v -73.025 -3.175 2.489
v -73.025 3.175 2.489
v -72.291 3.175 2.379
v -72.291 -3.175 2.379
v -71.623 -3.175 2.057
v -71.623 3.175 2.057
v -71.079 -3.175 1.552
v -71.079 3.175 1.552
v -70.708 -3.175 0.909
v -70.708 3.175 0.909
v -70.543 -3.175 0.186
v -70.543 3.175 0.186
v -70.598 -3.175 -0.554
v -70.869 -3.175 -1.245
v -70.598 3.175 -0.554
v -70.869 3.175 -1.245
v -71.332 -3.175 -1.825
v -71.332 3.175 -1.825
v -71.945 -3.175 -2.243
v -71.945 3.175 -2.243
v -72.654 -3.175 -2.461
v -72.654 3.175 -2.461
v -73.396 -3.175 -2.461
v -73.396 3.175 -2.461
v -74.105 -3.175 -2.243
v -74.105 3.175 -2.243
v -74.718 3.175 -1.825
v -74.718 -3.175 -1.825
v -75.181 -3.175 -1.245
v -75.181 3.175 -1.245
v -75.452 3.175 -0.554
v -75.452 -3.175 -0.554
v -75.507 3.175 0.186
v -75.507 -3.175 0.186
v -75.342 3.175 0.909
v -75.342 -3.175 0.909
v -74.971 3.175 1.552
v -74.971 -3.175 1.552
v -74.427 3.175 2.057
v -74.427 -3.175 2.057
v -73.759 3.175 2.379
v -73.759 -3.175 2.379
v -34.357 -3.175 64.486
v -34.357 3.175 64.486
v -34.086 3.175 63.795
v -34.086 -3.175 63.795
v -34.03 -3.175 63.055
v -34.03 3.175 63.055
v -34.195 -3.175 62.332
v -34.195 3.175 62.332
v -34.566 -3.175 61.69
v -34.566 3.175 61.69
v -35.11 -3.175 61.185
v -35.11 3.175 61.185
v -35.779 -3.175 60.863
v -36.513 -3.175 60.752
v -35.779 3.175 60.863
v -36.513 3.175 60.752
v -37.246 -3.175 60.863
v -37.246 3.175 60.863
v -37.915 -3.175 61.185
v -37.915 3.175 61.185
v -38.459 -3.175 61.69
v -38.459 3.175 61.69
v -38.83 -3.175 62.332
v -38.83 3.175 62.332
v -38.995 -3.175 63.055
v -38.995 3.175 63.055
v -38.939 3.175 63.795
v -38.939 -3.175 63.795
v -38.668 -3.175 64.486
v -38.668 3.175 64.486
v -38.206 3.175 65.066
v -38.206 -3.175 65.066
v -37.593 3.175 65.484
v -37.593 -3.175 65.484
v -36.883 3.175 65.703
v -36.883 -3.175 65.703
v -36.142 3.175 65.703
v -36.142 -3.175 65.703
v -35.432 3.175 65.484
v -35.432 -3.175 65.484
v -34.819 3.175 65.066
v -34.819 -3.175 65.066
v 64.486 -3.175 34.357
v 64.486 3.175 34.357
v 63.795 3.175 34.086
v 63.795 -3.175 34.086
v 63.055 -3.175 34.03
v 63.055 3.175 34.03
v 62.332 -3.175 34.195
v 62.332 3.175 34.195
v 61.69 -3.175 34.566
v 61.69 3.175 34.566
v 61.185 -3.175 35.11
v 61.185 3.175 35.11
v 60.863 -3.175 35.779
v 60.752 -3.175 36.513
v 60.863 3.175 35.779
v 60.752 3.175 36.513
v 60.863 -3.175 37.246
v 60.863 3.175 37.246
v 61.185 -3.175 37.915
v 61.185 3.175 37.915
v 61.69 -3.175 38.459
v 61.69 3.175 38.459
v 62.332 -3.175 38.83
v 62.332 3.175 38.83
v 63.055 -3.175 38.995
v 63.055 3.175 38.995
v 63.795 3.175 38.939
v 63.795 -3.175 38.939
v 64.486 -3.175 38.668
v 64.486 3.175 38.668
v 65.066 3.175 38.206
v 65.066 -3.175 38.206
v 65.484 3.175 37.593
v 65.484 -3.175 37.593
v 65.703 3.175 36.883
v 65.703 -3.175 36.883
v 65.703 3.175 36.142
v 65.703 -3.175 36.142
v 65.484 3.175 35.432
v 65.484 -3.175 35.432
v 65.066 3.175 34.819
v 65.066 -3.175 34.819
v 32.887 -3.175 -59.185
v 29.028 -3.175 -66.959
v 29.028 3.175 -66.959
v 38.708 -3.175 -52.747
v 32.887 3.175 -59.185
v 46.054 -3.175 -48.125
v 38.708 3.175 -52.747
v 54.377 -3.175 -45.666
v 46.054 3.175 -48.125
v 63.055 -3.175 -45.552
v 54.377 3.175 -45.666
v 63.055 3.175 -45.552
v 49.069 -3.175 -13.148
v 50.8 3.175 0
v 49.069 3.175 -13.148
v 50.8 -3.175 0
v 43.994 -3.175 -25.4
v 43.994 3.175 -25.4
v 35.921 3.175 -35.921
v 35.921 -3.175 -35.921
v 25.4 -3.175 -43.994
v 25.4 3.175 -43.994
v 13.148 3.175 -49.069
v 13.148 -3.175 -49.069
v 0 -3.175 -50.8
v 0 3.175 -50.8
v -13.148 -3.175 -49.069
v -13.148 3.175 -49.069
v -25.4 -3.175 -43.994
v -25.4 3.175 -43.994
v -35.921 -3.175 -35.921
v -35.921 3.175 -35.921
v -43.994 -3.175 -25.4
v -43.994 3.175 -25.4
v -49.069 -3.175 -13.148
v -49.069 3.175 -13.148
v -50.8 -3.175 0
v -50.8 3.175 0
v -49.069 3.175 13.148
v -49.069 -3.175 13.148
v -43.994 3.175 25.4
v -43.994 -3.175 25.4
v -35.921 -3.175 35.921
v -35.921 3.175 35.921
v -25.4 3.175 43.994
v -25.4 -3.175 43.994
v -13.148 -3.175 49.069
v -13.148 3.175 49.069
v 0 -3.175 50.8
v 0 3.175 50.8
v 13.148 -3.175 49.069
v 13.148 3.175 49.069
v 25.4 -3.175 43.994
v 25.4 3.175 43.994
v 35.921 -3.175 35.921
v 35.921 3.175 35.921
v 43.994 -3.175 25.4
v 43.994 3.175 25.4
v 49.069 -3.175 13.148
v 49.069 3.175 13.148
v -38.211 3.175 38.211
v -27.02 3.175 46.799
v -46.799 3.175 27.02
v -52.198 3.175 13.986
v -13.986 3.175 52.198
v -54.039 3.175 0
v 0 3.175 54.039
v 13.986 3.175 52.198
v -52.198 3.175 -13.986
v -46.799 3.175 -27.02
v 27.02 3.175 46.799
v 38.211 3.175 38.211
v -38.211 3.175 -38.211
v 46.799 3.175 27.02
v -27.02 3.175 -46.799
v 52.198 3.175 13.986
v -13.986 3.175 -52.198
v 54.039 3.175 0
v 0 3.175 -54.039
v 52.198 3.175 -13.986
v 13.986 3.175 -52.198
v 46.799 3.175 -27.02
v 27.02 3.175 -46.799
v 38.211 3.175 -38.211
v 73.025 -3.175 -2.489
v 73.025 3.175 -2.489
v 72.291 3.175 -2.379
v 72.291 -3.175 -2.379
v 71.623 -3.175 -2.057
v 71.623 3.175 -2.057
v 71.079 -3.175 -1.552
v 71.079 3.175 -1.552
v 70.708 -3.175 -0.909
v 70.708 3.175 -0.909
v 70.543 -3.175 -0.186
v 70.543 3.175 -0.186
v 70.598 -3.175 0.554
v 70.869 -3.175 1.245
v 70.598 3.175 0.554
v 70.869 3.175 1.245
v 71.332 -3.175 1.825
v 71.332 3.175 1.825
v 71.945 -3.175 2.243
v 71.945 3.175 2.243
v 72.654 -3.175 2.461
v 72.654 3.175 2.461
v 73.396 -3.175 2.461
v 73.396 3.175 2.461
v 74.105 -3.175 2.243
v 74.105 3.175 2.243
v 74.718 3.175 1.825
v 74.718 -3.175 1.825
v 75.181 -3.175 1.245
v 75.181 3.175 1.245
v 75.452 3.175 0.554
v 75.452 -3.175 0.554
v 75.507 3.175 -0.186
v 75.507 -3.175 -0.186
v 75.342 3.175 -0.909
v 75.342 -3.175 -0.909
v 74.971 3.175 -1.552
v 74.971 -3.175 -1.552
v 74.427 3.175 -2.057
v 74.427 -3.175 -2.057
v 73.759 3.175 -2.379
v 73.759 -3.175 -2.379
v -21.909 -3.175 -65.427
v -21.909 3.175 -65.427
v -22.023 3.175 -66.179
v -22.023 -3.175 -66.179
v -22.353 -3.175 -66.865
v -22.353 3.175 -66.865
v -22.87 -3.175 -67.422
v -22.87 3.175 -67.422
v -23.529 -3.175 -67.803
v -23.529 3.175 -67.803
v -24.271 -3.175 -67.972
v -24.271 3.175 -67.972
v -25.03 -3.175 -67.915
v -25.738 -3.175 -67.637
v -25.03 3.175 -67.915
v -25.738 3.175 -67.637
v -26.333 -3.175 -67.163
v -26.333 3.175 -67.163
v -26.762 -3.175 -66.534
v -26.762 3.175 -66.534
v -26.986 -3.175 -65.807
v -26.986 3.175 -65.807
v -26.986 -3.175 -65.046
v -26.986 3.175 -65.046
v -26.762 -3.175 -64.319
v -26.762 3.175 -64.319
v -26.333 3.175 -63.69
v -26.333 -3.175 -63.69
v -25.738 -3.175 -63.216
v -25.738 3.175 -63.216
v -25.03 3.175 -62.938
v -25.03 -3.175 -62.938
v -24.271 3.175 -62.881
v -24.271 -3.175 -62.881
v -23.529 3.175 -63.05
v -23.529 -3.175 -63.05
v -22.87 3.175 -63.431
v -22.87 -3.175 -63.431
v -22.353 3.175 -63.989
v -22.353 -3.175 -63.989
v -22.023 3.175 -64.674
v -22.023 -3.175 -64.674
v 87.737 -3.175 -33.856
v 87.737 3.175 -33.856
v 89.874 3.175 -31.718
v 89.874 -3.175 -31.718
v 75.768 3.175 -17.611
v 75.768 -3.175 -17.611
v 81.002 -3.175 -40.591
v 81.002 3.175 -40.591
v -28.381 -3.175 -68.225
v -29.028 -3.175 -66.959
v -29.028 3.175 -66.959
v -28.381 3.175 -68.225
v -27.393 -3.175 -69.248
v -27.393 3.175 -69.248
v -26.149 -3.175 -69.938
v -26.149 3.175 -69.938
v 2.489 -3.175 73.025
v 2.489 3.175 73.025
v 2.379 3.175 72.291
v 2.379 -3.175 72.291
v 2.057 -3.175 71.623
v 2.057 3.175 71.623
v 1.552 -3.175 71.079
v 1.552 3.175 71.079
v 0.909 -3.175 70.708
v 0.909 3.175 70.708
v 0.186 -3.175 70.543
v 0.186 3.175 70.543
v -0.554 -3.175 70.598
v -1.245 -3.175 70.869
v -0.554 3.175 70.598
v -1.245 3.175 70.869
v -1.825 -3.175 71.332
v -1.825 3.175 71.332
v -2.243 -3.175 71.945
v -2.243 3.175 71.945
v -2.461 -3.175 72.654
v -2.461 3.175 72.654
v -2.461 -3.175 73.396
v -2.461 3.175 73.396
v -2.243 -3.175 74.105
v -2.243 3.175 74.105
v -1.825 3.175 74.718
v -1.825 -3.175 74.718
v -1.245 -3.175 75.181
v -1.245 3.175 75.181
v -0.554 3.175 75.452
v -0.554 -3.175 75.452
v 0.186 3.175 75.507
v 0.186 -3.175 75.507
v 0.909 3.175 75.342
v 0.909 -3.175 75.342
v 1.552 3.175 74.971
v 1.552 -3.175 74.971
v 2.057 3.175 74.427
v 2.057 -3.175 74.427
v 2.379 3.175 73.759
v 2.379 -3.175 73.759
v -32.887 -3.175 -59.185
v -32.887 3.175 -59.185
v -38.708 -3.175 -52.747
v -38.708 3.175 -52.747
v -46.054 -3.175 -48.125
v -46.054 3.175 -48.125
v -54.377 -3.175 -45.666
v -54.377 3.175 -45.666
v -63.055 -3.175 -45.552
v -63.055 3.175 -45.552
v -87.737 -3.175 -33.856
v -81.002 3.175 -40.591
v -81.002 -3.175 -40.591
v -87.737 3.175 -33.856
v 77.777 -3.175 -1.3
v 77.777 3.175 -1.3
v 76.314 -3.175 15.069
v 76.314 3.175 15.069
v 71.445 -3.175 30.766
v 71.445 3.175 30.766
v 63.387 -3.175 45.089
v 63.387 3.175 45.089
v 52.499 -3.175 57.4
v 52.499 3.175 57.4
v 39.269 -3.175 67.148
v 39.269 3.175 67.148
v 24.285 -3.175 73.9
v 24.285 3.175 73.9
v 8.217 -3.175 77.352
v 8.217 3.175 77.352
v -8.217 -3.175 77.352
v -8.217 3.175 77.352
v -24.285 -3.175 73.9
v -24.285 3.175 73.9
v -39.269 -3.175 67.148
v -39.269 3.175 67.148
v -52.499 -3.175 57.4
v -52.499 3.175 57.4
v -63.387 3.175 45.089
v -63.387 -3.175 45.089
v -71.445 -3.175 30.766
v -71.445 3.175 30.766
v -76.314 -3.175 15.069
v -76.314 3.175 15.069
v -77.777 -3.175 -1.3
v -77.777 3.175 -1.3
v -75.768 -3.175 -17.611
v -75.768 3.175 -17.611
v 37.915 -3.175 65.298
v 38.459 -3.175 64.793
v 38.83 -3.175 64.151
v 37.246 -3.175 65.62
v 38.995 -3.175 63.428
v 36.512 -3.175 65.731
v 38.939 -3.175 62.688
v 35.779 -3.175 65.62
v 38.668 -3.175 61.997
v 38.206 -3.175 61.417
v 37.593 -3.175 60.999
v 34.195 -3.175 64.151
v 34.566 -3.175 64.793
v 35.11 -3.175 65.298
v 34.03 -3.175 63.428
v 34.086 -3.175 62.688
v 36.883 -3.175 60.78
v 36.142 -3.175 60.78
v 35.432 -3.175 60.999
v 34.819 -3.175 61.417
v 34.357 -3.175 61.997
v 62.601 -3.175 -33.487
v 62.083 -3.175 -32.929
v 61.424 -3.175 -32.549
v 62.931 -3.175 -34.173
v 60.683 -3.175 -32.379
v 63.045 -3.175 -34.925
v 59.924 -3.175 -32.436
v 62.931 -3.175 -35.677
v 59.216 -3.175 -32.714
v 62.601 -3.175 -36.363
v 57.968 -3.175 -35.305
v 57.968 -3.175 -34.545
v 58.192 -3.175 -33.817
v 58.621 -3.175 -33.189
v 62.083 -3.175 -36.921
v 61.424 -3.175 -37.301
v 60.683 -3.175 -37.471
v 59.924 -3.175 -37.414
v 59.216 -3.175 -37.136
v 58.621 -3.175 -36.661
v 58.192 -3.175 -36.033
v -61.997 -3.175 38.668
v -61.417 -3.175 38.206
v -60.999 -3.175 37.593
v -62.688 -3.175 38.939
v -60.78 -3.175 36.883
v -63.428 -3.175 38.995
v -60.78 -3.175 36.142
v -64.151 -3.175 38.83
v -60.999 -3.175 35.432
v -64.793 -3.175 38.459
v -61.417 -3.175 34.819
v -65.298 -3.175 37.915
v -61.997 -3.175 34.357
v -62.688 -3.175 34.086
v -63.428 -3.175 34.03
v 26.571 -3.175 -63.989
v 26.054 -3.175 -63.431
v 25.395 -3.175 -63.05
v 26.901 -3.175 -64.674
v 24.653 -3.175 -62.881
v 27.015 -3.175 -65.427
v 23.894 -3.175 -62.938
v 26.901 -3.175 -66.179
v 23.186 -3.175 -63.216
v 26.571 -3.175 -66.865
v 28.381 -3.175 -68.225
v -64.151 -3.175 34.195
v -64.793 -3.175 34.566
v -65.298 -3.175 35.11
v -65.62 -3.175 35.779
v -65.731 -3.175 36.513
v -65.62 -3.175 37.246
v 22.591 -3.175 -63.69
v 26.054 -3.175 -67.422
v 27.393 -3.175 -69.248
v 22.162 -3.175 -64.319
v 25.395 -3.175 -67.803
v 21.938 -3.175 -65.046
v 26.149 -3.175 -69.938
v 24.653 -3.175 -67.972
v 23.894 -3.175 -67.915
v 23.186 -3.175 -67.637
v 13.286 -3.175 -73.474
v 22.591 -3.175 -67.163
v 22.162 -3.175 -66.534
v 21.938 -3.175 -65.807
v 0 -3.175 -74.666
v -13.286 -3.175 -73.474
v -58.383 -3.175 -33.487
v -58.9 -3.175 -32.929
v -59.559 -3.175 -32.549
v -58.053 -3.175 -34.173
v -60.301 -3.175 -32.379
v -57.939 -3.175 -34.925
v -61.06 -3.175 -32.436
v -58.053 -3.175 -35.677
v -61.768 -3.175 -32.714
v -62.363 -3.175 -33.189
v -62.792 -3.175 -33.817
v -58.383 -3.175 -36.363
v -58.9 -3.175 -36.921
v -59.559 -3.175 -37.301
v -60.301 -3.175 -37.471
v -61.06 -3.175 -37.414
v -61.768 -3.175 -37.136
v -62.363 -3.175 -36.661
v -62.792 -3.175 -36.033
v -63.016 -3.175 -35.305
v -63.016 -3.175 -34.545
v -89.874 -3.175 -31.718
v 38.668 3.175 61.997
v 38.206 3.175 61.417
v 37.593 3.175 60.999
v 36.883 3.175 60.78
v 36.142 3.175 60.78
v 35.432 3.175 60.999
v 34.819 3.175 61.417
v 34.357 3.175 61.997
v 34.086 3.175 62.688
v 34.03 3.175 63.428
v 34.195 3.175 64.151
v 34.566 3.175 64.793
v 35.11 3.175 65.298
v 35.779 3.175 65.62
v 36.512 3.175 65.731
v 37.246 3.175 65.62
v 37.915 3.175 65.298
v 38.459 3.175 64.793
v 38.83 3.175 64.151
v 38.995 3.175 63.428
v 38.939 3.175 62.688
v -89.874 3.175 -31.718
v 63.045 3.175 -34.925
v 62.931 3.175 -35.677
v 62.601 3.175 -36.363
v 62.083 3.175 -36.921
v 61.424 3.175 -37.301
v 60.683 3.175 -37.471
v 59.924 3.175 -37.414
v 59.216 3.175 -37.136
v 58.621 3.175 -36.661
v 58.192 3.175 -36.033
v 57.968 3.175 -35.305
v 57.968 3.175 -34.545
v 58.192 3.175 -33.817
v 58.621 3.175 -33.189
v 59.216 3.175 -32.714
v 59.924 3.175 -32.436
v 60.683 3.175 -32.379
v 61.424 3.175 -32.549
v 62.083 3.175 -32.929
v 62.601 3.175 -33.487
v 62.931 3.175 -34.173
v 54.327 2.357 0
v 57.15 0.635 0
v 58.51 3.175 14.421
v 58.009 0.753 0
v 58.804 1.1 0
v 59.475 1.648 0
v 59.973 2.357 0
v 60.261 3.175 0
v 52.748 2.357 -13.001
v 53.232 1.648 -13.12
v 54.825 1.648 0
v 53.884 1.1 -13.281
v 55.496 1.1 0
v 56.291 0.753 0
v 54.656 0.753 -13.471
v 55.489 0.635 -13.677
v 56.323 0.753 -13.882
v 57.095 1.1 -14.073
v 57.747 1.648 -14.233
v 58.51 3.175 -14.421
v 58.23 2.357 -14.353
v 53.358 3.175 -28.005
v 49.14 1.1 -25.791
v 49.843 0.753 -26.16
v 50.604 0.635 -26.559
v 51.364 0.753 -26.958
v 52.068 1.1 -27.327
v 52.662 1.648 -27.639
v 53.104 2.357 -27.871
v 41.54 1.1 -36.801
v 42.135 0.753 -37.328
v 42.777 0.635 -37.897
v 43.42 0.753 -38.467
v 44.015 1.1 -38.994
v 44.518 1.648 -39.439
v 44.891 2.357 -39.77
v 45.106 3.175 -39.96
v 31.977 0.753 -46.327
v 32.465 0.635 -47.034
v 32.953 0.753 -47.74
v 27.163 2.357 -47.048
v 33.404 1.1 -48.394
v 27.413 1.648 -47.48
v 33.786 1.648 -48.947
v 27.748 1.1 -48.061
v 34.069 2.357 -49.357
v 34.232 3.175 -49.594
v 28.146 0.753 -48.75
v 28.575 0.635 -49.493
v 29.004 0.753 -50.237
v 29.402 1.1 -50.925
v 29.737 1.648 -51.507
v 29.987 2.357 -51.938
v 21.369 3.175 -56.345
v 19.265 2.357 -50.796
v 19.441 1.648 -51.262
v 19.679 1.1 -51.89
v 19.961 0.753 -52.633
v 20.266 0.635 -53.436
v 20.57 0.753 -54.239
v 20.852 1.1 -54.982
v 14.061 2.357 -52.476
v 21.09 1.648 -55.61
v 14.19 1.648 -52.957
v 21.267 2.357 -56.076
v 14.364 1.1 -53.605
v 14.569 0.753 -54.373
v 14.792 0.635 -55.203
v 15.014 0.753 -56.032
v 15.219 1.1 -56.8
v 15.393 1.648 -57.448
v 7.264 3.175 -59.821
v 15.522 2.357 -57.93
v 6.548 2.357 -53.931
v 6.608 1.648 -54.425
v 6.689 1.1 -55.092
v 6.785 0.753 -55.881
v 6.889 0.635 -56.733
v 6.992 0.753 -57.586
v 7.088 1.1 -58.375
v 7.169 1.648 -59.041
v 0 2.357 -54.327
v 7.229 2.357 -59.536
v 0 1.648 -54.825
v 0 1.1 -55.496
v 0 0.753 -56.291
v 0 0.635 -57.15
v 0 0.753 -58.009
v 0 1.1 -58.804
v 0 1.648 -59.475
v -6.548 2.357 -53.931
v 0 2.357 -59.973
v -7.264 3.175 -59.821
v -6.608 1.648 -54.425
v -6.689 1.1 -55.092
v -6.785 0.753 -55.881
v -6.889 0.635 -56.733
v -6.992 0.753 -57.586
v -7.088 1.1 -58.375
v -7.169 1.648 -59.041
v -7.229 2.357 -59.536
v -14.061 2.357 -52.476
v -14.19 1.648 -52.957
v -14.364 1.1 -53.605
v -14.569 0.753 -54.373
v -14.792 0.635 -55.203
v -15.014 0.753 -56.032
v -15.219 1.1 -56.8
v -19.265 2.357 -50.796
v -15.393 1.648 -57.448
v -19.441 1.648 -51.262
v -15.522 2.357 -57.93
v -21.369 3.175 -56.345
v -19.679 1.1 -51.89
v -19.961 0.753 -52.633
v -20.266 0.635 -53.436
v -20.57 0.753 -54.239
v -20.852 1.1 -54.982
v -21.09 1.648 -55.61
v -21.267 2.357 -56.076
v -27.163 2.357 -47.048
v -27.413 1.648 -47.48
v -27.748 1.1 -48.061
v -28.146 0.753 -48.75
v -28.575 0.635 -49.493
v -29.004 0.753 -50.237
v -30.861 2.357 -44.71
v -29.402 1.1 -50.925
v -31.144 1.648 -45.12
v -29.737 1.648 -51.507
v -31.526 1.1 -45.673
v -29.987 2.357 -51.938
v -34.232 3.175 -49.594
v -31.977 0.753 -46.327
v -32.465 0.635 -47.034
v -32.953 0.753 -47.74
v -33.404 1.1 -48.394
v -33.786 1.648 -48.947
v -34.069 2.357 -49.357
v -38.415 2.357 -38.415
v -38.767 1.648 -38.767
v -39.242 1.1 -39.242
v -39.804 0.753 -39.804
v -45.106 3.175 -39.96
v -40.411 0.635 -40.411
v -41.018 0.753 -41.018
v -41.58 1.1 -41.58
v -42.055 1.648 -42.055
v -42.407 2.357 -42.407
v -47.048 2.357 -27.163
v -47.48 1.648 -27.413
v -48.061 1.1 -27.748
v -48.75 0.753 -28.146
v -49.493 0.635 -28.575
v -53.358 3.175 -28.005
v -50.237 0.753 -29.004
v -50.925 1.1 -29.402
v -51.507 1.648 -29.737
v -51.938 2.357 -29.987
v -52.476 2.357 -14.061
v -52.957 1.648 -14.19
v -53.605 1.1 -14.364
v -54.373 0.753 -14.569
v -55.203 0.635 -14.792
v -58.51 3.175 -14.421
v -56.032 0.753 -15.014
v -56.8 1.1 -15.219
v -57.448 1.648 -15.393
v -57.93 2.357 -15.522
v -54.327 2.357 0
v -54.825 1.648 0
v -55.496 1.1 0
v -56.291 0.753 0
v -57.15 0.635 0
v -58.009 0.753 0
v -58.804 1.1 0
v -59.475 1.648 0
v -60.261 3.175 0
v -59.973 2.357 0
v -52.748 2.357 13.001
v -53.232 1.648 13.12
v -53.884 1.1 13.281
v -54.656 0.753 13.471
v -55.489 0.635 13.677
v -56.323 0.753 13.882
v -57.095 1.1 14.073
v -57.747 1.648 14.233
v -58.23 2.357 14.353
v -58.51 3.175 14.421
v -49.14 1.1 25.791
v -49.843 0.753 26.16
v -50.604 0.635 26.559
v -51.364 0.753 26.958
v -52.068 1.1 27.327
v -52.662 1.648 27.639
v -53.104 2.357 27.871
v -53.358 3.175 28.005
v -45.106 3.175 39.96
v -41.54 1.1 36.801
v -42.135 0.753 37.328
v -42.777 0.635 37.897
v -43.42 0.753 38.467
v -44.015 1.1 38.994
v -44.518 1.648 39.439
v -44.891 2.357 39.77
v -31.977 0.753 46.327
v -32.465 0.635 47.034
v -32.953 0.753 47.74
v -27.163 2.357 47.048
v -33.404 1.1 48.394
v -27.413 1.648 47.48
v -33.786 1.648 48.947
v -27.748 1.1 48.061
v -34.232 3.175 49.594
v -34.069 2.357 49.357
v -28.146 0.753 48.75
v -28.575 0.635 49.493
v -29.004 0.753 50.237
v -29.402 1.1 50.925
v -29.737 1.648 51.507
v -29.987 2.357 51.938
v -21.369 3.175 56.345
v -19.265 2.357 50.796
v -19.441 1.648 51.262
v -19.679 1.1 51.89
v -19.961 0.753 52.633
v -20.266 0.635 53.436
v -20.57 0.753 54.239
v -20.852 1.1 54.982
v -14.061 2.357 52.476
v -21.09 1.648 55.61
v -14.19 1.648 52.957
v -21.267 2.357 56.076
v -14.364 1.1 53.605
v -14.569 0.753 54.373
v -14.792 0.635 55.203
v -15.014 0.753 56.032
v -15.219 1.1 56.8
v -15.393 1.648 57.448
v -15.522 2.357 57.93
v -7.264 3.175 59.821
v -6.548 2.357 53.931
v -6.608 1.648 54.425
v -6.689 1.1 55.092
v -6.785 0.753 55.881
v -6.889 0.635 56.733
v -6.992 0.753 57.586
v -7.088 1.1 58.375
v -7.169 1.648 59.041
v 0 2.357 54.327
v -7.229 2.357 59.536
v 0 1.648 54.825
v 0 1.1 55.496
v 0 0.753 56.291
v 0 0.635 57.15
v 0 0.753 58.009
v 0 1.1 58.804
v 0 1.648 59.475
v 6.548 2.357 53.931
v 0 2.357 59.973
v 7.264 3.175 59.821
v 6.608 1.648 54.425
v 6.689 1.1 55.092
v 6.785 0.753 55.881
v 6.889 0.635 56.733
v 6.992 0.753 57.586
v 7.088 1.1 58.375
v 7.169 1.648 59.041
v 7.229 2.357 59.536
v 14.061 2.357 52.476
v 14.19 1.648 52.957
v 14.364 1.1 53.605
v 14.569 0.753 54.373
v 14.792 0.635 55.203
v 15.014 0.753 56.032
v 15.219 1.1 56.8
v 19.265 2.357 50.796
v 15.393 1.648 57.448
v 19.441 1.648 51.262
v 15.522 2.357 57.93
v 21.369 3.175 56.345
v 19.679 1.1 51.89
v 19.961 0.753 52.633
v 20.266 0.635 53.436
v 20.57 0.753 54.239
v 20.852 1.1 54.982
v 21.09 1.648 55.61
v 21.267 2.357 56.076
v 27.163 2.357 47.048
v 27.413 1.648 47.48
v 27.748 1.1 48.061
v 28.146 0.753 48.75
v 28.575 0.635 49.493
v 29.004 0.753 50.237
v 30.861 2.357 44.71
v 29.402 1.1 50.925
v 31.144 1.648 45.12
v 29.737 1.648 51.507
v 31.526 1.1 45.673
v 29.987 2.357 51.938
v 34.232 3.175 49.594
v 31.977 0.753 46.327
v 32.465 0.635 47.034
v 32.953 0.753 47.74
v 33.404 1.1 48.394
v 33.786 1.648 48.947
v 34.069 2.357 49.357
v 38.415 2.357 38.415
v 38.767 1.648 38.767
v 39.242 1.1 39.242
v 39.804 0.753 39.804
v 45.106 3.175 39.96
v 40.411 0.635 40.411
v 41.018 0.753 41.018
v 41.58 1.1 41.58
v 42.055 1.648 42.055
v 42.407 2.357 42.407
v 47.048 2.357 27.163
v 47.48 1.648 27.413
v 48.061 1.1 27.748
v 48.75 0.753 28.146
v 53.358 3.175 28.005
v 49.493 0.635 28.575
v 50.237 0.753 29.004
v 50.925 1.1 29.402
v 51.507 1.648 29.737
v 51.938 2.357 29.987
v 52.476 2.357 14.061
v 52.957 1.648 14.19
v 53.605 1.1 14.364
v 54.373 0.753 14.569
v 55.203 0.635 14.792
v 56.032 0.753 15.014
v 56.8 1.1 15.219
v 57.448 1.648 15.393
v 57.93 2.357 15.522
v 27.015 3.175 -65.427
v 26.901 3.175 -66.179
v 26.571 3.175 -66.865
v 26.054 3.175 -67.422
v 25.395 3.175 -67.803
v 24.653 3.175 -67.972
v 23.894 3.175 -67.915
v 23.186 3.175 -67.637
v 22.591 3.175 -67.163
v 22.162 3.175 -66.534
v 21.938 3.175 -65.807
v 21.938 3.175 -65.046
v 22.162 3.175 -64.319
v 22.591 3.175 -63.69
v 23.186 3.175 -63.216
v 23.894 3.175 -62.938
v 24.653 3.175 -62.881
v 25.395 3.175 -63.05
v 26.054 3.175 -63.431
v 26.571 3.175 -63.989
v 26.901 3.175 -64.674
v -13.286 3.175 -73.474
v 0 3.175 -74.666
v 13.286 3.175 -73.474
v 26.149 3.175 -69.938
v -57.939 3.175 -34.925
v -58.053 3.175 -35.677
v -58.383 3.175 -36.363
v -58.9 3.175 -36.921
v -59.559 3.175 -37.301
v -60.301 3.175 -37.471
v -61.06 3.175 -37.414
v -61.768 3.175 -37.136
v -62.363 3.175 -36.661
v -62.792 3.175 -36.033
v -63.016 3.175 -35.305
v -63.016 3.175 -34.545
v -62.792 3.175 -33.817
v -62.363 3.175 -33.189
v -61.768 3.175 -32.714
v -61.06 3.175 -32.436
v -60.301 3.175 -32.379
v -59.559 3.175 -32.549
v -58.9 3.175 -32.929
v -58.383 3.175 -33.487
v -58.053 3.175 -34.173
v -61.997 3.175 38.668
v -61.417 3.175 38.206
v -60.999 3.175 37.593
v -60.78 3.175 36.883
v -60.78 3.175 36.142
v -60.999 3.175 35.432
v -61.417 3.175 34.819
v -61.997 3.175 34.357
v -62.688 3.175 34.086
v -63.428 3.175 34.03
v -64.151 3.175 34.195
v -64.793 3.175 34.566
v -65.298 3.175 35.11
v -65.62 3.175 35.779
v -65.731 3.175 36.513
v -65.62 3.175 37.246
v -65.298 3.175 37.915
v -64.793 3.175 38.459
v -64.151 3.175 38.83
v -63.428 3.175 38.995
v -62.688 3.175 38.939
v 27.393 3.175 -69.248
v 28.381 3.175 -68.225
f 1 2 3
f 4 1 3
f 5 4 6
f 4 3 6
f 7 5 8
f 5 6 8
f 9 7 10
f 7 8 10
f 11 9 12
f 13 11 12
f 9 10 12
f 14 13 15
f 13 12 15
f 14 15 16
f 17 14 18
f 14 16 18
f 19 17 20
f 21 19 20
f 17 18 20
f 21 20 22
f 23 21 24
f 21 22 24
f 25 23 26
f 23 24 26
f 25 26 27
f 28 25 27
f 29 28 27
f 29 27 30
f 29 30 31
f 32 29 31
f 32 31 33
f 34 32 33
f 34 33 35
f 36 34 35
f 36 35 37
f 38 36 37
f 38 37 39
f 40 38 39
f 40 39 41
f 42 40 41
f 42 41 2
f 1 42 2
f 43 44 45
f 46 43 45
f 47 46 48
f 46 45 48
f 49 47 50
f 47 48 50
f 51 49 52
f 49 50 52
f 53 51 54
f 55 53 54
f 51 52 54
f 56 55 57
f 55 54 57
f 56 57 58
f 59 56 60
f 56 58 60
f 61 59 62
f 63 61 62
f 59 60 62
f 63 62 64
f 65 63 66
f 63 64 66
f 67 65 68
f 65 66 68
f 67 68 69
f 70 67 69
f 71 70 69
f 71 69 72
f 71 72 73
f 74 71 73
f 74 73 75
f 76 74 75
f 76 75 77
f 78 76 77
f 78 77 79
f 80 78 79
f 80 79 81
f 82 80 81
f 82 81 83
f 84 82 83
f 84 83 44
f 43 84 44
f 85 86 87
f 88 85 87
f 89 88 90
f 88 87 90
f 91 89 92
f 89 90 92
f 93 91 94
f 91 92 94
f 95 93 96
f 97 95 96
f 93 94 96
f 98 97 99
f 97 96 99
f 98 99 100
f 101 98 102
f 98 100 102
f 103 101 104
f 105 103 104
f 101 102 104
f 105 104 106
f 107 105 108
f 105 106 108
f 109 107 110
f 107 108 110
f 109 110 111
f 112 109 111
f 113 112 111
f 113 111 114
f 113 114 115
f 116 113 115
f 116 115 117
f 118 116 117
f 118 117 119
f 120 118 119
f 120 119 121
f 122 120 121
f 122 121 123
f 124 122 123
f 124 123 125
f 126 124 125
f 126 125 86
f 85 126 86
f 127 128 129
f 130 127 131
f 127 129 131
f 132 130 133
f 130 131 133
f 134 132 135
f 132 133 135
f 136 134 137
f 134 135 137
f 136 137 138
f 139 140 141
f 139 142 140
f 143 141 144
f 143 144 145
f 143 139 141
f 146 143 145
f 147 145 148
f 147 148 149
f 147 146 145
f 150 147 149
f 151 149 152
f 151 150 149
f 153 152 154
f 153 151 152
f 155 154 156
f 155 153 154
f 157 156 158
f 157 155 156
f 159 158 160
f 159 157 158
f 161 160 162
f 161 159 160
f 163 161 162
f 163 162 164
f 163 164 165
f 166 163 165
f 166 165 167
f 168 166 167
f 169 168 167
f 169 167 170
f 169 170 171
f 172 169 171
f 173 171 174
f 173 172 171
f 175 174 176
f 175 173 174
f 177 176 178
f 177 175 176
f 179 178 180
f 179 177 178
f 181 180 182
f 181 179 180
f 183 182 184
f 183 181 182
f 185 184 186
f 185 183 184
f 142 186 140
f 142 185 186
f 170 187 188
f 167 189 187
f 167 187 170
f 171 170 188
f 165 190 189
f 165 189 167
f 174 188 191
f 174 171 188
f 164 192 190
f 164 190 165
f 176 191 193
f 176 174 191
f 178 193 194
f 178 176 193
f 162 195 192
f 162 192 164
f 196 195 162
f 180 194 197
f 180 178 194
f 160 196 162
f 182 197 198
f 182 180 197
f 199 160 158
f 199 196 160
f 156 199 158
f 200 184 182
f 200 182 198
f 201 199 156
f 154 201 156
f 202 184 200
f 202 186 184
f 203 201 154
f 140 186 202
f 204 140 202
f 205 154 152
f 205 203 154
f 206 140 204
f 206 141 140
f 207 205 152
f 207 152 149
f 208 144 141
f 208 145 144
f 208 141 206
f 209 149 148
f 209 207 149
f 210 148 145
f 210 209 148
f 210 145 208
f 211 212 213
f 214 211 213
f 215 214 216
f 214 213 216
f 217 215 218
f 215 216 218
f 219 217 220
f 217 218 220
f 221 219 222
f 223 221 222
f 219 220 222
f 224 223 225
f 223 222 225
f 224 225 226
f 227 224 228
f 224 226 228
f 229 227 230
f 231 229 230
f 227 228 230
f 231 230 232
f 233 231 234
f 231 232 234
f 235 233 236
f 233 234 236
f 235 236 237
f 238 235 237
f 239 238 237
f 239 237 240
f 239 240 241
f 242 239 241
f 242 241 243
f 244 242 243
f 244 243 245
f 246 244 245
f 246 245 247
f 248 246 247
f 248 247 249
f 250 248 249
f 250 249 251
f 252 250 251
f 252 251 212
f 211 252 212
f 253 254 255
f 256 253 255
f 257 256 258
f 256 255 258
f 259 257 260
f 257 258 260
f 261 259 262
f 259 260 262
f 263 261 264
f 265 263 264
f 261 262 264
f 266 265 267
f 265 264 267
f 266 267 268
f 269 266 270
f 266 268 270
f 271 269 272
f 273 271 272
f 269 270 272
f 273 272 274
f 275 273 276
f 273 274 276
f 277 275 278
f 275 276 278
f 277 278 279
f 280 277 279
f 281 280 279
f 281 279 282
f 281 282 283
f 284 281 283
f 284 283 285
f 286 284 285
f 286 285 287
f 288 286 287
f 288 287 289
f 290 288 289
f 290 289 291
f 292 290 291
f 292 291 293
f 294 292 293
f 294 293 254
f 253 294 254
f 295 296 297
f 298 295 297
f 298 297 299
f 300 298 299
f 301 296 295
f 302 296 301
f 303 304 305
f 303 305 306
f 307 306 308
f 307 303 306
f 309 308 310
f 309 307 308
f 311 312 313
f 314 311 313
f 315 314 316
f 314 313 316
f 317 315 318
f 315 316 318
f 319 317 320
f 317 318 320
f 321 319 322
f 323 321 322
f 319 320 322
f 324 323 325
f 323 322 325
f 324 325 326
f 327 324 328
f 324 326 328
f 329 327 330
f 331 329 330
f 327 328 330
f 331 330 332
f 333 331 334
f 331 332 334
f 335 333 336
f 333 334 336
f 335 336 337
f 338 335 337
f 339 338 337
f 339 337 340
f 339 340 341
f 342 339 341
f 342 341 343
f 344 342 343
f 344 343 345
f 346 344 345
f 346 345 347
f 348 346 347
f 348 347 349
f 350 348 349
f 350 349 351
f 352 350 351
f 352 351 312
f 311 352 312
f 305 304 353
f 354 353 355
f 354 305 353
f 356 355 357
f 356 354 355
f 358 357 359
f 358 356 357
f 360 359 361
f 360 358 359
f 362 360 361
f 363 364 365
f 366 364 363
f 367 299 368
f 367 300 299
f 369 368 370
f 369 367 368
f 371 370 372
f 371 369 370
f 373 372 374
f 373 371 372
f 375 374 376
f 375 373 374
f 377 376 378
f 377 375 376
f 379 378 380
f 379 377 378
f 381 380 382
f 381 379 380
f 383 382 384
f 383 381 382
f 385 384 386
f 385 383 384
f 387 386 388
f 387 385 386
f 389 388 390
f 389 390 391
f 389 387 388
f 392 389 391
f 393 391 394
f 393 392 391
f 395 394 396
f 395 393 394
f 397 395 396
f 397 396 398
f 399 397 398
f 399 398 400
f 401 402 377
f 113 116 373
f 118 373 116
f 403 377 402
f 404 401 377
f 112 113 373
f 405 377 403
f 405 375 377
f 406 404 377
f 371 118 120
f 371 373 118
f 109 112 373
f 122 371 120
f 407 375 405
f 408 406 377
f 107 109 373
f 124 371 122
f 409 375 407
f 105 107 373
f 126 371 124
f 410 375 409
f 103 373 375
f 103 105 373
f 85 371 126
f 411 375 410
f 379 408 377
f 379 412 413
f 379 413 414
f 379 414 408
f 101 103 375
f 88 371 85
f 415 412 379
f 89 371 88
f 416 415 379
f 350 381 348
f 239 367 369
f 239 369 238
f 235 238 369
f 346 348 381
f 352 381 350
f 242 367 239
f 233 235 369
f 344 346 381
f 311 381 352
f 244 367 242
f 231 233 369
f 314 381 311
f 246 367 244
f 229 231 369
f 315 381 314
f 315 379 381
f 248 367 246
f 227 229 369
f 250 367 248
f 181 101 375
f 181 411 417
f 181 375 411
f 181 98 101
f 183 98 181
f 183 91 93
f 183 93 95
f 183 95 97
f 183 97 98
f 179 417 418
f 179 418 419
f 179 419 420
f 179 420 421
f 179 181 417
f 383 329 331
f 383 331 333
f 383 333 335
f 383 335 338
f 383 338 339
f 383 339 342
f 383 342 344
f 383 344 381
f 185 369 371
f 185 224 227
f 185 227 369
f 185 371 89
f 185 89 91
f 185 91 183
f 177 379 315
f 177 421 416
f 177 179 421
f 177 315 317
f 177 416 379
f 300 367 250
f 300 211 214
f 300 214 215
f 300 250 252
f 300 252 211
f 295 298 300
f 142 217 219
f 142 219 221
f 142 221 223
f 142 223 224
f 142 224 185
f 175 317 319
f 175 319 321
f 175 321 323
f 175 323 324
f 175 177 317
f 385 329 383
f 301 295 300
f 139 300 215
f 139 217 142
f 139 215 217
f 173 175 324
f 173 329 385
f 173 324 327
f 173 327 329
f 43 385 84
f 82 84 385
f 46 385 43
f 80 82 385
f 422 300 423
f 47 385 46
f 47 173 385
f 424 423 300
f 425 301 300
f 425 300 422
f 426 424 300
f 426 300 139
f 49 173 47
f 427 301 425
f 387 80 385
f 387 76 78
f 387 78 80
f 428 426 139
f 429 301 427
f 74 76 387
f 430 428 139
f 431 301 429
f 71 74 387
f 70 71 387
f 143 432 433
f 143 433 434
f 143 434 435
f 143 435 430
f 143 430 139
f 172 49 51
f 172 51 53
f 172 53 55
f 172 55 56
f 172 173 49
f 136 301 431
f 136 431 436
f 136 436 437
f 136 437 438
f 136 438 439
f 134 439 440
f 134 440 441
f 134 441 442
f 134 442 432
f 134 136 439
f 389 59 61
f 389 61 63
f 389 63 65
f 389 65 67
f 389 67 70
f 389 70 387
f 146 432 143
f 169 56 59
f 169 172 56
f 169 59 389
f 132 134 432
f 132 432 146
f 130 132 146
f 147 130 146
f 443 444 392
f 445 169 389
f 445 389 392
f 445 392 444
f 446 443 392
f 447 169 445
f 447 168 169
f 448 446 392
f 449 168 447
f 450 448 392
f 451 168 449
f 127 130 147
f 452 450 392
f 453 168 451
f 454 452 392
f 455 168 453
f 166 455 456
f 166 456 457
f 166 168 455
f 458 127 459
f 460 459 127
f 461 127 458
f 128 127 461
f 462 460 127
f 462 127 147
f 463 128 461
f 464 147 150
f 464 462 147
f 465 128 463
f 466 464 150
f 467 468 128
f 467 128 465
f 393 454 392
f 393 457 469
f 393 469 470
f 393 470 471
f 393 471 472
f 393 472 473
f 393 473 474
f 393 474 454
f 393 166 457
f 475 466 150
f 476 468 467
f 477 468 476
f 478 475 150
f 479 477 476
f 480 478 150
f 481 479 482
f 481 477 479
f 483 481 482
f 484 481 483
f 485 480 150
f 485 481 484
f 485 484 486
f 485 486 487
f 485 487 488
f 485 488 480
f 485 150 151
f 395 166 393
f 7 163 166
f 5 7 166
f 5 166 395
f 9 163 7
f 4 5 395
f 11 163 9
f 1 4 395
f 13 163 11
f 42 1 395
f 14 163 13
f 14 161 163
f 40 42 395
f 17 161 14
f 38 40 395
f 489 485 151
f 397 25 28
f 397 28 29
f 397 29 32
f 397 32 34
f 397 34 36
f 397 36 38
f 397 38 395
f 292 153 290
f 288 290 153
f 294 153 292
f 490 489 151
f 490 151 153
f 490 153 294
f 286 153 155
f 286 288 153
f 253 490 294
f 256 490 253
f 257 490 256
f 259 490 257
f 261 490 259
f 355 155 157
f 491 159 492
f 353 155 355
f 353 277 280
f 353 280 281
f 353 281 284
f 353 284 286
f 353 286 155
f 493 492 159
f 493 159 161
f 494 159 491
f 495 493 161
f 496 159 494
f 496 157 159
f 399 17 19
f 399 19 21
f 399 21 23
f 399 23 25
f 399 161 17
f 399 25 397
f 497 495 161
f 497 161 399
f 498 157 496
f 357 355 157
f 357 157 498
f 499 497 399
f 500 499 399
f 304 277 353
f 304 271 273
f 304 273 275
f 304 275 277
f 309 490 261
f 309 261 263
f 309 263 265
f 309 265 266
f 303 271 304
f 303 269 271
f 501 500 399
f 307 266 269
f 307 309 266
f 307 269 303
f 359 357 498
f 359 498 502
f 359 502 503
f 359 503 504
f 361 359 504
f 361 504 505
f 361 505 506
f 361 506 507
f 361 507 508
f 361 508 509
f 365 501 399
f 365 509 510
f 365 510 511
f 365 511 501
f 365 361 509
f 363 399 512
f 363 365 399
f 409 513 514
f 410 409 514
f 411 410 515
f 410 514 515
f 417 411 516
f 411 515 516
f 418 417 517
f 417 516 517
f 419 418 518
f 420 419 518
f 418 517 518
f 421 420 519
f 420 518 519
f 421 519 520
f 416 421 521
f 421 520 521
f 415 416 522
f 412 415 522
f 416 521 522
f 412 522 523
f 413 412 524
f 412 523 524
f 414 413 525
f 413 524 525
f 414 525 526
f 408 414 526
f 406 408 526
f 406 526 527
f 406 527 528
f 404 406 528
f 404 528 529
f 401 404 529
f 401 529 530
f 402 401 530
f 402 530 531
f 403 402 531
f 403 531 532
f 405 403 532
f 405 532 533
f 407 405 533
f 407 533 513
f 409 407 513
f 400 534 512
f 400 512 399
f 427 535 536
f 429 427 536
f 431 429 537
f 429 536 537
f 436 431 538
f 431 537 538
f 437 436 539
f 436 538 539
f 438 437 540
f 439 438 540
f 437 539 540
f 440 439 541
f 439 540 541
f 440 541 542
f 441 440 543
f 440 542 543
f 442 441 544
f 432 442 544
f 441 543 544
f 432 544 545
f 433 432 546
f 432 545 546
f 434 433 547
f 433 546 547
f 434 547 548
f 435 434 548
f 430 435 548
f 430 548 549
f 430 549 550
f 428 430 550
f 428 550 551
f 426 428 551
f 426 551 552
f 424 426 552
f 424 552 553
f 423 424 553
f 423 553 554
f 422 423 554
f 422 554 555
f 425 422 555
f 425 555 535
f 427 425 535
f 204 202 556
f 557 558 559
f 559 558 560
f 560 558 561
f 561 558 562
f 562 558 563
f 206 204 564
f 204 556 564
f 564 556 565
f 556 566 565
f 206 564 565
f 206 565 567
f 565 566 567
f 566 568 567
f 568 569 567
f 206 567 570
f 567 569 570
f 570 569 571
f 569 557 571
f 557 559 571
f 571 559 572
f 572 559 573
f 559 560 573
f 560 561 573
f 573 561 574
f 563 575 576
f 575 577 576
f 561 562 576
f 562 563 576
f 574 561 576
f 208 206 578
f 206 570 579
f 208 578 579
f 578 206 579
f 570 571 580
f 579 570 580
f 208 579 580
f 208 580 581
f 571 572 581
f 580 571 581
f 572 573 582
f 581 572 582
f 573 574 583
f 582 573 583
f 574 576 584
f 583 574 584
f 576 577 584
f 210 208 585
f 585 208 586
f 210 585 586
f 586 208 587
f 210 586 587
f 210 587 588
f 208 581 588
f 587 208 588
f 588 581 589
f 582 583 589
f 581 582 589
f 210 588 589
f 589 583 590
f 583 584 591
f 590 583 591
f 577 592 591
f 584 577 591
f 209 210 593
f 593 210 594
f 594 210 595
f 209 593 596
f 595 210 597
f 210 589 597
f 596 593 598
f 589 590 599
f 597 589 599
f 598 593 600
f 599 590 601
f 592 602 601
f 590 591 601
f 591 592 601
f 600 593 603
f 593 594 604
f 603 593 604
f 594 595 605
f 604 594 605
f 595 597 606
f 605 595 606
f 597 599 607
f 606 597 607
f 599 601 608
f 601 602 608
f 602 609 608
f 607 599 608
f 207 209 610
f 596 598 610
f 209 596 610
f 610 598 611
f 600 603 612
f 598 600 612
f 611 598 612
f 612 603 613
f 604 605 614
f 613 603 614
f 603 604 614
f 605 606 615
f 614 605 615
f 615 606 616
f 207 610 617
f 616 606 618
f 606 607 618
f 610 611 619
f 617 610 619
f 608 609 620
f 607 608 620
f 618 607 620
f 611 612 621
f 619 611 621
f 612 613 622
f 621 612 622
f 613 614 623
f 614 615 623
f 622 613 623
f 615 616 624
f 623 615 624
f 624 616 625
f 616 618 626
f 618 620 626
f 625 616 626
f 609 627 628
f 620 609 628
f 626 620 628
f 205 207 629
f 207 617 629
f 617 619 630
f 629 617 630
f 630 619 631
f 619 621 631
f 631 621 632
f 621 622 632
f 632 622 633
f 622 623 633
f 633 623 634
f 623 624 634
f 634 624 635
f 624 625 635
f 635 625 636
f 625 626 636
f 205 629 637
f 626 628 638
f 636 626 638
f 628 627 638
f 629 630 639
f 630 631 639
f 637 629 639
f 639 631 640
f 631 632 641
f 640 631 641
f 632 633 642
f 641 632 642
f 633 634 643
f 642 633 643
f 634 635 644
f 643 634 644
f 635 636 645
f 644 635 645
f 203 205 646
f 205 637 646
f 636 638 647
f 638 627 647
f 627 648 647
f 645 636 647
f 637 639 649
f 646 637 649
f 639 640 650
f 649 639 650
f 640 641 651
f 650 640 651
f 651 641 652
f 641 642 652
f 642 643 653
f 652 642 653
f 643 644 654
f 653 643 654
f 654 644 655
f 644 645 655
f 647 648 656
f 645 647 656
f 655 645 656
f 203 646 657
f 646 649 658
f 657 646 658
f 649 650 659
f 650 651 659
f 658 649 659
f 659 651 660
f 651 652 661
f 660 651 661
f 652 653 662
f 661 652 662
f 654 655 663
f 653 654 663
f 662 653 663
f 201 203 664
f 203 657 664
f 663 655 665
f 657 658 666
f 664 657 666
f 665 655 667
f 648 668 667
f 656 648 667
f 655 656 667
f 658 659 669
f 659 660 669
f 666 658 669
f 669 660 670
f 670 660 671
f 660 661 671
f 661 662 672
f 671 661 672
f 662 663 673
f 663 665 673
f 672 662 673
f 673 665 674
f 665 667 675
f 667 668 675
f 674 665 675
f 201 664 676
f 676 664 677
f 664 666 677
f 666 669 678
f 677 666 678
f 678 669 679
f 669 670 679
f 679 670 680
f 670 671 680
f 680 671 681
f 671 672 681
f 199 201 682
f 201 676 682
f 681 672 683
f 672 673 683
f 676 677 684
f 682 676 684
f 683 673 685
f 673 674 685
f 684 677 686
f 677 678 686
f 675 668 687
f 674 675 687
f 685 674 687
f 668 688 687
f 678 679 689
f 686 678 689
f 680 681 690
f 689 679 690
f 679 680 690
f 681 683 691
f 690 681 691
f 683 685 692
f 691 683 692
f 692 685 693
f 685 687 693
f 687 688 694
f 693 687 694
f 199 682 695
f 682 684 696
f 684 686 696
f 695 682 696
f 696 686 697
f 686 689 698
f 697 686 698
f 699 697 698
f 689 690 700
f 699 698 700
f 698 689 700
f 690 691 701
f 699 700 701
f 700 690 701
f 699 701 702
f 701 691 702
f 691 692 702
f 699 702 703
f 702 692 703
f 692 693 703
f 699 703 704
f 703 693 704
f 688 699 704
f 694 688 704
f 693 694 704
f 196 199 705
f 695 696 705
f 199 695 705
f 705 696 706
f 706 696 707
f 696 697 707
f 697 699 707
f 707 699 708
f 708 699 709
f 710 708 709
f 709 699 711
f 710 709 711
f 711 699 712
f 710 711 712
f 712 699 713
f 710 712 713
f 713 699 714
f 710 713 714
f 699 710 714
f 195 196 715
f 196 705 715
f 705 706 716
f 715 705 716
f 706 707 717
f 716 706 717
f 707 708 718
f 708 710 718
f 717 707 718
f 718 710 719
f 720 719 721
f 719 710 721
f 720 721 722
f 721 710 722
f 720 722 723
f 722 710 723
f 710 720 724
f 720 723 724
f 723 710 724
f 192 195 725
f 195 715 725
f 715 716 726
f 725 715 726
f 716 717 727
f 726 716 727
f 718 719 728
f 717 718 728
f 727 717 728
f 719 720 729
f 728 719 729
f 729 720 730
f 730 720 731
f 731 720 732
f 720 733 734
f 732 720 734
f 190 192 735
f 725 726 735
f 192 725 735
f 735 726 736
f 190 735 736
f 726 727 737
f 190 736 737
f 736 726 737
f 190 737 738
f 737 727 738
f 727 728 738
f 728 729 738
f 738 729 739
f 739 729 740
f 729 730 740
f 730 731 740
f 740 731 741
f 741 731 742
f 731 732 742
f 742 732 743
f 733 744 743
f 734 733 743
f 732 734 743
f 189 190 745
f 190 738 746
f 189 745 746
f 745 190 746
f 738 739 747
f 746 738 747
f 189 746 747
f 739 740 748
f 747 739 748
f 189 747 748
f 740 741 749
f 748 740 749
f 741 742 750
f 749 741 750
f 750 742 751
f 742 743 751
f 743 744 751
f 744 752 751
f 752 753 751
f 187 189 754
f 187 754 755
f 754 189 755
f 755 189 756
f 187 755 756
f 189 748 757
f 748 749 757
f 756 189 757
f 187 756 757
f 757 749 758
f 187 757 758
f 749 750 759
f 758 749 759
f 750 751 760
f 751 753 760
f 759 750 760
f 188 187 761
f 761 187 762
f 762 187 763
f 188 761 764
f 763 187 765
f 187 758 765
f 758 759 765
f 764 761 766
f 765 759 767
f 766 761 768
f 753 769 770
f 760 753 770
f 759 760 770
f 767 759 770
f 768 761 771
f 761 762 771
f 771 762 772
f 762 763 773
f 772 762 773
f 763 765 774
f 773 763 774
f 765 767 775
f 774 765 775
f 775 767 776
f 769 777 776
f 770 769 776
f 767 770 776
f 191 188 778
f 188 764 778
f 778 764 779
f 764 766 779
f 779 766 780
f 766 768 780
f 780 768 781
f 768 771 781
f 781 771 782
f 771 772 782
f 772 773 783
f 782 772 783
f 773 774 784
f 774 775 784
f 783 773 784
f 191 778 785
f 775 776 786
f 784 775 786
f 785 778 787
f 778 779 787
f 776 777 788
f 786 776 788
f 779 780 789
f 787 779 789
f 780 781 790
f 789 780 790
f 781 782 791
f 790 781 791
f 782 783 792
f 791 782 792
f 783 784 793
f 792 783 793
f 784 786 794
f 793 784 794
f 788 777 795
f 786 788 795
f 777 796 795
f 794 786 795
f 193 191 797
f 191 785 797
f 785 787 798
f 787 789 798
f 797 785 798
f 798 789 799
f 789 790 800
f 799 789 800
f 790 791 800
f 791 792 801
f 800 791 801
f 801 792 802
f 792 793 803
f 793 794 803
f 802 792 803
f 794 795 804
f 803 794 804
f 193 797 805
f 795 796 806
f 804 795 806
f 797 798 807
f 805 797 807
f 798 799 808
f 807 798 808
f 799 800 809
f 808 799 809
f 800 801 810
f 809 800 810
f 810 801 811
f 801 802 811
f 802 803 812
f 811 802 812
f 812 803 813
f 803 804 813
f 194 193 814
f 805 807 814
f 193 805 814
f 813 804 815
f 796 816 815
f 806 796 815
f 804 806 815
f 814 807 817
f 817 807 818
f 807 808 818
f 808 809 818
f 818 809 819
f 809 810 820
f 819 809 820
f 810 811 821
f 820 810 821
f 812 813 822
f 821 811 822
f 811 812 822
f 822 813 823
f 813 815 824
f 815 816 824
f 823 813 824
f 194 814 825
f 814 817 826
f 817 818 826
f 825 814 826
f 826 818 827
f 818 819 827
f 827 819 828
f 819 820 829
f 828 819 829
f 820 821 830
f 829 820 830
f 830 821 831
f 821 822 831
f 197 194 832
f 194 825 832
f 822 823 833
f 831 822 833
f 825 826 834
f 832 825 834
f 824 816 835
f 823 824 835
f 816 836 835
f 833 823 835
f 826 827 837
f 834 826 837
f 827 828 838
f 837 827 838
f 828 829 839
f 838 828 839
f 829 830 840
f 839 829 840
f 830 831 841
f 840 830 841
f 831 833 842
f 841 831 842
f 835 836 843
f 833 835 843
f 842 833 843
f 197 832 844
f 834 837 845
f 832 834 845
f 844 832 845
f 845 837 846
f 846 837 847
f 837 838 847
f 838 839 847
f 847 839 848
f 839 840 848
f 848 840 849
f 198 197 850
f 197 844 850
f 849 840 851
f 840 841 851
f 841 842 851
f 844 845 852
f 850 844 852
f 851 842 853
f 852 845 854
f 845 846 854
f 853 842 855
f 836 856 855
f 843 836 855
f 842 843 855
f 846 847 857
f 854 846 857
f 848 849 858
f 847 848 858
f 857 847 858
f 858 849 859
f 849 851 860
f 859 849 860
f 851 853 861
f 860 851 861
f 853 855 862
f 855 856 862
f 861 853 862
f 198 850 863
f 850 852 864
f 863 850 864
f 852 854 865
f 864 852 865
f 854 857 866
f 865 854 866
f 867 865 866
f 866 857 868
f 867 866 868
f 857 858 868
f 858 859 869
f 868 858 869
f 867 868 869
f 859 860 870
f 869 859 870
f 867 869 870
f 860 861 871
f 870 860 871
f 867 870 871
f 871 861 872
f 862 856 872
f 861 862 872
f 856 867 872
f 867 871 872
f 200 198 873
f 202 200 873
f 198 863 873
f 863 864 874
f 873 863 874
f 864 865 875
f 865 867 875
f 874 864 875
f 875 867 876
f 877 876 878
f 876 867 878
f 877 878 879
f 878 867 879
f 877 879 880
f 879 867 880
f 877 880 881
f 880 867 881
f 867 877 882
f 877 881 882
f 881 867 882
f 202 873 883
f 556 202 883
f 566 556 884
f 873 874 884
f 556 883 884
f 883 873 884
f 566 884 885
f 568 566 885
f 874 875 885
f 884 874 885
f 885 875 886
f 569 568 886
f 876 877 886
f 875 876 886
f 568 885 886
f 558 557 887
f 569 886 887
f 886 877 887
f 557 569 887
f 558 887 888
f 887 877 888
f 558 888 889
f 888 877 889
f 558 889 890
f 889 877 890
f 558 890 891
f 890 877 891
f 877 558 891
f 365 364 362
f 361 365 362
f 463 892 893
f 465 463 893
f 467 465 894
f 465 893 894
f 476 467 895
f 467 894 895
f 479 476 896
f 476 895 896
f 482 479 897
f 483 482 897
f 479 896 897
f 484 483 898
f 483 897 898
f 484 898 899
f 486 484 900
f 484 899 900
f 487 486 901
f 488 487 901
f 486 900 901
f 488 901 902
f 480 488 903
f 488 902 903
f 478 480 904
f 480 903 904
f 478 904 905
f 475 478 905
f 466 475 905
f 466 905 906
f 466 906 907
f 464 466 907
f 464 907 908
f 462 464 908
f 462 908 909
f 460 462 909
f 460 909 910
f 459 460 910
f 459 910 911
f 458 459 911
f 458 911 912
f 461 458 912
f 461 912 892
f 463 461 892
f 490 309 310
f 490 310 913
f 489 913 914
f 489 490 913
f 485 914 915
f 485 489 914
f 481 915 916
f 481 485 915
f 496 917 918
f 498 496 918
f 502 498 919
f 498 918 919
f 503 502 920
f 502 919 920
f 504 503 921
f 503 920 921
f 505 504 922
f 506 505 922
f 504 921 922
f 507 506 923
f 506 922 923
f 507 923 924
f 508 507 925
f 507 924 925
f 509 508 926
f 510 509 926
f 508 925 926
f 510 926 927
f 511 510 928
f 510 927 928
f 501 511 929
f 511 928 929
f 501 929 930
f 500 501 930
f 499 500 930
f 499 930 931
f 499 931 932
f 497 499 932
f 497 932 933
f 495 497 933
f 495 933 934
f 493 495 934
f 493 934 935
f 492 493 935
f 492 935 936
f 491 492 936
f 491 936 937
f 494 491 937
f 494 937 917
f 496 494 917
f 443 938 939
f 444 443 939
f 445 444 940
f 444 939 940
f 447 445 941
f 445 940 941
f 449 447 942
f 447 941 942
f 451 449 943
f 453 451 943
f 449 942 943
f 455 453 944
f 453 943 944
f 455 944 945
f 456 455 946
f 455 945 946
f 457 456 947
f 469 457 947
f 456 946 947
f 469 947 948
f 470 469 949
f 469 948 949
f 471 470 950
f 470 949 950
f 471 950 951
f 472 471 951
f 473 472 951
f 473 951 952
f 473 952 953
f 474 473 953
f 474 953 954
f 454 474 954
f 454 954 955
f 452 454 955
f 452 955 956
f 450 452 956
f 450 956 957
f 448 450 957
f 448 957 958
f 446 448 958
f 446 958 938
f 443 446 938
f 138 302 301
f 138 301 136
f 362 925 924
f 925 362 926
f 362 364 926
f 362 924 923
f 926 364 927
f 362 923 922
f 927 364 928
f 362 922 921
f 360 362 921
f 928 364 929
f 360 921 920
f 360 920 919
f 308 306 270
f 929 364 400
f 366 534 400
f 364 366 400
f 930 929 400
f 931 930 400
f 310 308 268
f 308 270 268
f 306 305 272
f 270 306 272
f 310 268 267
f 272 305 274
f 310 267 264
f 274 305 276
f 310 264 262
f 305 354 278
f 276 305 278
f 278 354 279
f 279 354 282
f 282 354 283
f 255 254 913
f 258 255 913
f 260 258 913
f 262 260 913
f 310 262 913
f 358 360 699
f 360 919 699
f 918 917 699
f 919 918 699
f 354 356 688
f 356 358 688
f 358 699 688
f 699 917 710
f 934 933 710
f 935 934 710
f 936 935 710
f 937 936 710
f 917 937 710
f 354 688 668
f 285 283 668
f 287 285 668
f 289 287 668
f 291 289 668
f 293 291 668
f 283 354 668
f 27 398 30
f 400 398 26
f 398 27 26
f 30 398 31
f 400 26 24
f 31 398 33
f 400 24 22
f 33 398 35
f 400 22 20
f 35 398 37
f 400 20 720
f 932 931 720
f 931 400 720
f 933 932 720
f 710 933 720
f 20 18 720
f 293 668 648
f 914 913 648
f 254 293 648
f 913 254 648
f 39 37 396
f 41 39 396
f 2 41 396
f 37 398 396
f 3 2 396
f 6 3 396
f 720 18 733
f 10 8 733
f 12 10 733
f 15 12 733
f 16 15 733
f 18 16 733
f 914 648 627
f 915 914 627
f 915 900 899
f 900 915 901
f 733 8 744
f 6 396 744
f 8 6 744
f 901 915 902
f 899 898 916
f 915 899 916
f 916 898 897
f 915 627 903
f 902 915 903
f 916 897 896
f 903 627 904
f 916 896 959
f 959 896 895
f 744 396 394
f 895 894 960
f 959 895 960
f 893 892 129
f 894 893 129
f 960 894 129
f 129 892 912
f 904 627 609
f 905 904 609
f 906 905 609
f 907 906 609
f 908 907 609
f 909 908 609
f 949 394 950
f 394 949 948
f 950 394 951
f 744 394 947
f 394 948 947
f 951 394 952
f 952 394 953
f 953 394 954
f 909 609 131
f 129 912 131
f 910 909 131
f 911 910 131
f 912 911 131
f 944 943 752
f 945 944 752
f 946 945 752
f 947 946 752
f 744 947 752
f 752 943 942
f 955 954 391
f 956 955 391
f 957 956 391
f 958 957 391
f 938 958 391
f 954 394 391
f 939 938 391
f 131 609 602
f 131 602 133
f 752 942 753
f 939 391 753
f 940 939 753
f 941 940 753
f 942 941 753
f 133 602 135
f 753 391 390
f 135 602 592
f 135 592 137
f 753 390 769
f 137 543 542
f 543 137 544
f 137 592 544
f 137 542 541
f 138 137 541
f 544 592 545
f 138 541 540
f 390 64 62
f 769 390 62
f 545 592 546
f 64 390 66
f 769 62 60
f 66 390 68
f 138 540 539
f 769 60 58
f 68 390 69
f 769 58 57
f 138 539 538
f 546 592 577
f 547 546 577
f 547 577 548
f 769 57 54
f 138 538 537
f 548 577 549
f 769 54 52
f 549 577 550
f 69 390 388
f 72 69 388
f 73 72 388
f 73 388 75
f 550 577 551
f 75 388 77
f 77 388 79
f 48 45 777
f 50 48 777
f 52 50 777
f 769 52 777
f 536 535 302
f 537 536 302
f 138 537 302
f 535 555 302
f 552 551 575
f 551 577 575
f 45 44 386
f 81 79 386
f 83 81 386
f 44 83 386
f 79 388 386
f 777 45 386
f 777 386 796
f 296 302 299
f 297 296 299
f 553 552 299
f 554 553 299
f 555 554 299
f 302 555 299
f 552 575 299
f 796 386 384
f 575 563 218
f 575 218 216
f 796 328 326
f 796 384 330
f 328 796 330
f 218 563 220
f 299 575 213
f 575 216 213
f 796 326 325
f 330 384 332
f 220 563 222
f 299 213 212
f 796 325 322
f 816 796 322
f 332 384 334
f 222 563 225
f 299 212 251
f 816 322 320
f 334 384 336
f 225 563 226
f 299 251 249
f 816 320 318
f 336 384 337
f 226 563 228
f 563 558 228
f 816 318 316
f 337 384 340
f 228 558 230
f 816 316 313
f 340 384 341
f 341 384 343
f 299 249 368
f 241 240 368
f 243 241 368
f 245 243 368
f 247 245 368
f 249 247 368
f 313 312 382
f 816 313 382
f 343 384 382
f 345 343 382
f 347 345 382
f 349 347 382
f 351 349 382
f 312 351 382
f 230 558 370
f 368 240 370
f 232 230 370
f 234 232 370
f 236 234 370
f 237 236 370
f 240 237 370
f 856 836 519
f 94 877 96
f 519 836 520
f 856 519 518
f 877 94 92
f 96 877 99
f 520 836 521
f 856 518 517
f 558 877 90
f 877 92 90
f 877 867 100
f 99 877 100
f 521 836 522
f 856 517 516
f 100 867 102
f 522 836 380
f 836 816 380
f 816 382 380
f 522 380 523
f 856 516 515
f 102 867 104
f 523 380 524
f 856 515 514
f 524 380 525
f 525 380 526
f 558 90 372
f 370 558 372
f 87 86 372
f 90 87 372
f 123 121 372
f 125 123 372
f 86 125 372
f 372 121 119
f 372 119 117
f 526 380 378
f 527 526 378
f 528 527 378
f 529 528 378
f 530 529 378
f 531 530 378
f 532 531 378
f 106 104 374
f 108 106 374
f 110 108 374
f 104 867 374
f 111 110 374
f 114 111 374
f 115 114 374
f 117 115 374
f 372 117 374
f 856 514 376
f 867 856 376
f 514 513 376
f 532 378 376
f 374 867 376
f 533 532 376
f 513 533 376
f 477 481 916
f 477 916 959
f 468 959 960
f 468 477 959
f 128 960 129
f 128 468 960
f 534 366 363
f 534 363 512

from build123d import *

# Parameters (mm, degrees)
SKETCH1_R           = 63.5
SKETCH1_R_2         = 50.8
BOSS_EXTRUDE1_DEPTH = 3.175
SKETCH2_R           = 3.175
SKETCH3_R           = 77.7875
SKETCH3_R_2         = 63.5
BOSS_EXTRUDE2_DEPTH = 6.35
SKETCH4_R           = 2.4892
CUT_EXTRUDE1_DEPTH  = 7.35
CIRPATTERN1_COUNT   = 12
BOSS_EXTRUDE3_DEPTH = 6.35
SKETCH6_R           = 31.75
CUT_EXTRUDE2_DEPTH  = 7.35
SKETCH7_R           = 2.5527
CUT_EXTRUDE3_DEPTH  = 7.35
BOSS_EXTRUDE4_DEPTH = 6.35
CUT_EXTRUDE4_DEPTH  = 7.35


with BuildPart() as part:
    # Sketch1 → Boss-Extrude1 (new body, symmetric)
    with BuildSketch(Plane(origin=(0, 0, 0), x_dir=(1, 0, 0), z_dir=(0, 1, 0))):
        Circle(SKETCH1_R)
        Circle(SKETCH1_R_2, mode=Mode.SUBTRACT)
    extrude(amount=BOSS_EXTRUDE1_DEPTH, both=True)

    # Sketch2 → Cut-Revolve1 (revolve, cut)
    with BuildSketch(Plane.XY):
        with Locations((57.15, 3.81)):
            Circle(SKETCH2_R)
    revolve(axis=Axis((0, 0, 0), (0, 1, 0)), mode=Mode.SUBTRACT)

    # Sketch3 → Boss-Extrude2 (add, through all)
    with BuildSketch(Plane.XZ.offset(3.175)):
        Circle(SKETCH3_R)
        Circle(SKETCH3_R_2, mode=Mode.SUBTRACT)
    extrude(amount=-BOSS_EXTRUDE2_DEPTH)

    # Sketch4 → Cut-Extrude1 (cut, through all)
    with BuildSketch(Plane(origin=(0, 3.175, 0), x_dir=(1, 0, 0), z_dir=(0, 1, 0))):
        with Locations((0, -73.025)):
            Circle(SKETCH4_R)
    cut_extrude1 = extrude(amount=-CUT_EXTRUDE1_DEPTH, mode=Mode.SUBTRACT)

    # CirPattern1: Cut-Extrude1 ×12 about axis, 5 skipped
    cirpattern1_axis = Axis((0, 0, 0), (0, 1, 0))
    add([cut_extrude1.rotate(cirpattern1_axis, i * 360 / CIRPATTERN1_COUNT) for i in range(1, CIRPATTERN1_COUNT) if i not in (4, 5, 6, 7, 8)], mode=Mode.SUBTRACT)

    # Sketch5 → Boss-Extrude3 (add, through all)
    with BuildSketch(Plane(origin=(0, 3.175, 0), x_dir=(1, 0, 0), z_dir=(0, 1, 0))):
        with BuildLine():
            Line((74.895357071, 21.013820344), (87.737123324, 33.855586598))
            Line((87.737123324, 33.855586598), (81.001931233, 40.590778688))
            Line((81.001931233, 40.590778688), (71.363979938, 30.952827393))
            ThreePointArc((71.363979938, 30.952827393), (73.298324543, 26.043248173), (74.895357071, 21.013820344))
        make_face()
        with BuildLine():
            Line((-71.363979938, 30.952827393), (-81.001931233, 40.590778688))
            Line((-81.001931233, 40.590778688), (-87.737123324, 33.855586598))
            Line((-87.737123324, 33.855586598), (-74.895357071, 21.013820344))
            ThreePointArc((-74.895357071, 21.013820344), (-73.298324543, 26.043248173), (-71.363979938, 30.952827393))
        make_face()
    extrude(amount=-BOSS_EXTRUDE3_DEPTH)

    # Sketch6 → Cut-Extrude2 (cut, through all)
    with BuildSketch(Plane(origin=(0, 3.175, 0), x_dir=(1, 0, 0), z_dir=(0, 1, 0))):
        with Locations((59.128754095, 77.058092601)):
            Circle(SKETCH6_R)
    cut_extrude2 = extrude(amount=-CUT_EXTRUDE2_DEPTH, mode=Mode.SUBTRACT)

    # Sketch7 → Cut-Extrude3 (cut, through all)
    with BuildSketch(Plane(origin=(0, 3.175, 0), x_dir=(1, 0, 0), z_dir=(0, 1, 0))):
        with Locations((-24.461985581, 65.426552419)):
            Circle(SKETCH7_R)
        with Locations((-60.491874454, 34.925)):
            Circle(SKETCH7_R)
        with Locations((24.461985581, 65.426552419)):
            Circle(SKETCH7_R)
        with Locations((60.491874454, 34.925)):
            Circle(SKETCH7_R)
    extrude(amount=-CUT_EXTRUDE3_DEPTH, mode=Mode.SUBTRACT)

    # Sketch9 → Boss-Extrude4 (add, through all)
    with BuildSketch(Plane(origin=(0, 3.175, 0), x_dir=(1, 0, 0), z_dir=(0, 1, 0))):
        Polygon((75.767612718, 17.611474078), (73.630311762, 19.748775035), (87.737123324, 33.855586598), (89.874424281, 31.718285641), align=None)
        Polygon((81.001931233, 40.590778688), (63.054974858, 45.551787033), (71.363979938, 30.952827393), align=None)
    boss_extrude4 = extrude(amount=-BOSS_EXTRUDE4_DEPTH)

    # Mirror1: Cut-Extrude2, Boss-Extrude4 across plane
    add(cut_extrude2.mirror(Plane(origin=(0, 0, 0), x_dir=(0, 0, 1), z_dir=(1, 0, 0))), mode=Mode.SUBTRACT)
    add(boss_extrude4.mirror(Plane(origin=(0, 0, 0), x_dir=(0, 0, 1), z_dir=(1, 0, 0))))

    # Sketch8 → Cut-Extrude4 (cut, through all)
    with BuildSketch(Plane.XZ.offset(3.175)):
        with BuildLine():
            ThreePointArc((-29.027902052, -66.958527944), (-27.924980023, -68.773522948), (-26.148609279, -69.937632415))
            ThreePointArc((-26.148609279, -69.937632415), (0, -74.666071244), (26.148609279, -69.937632415))
            ThreePointArc((26.148609279, -69.937632415), (27.924980023, -68.773522948), (29.027902052, -66.958527944))
            ThreePointArc((29.027902052, -66.958527944), (28.220438074, -69.795964761), (27.679819148, -72.696098714))
            ThreePointArc((27.679819148, -72.696098714), (0, -77.7875), (-27.679819148, -72.696098714))
            ThreePointArc((-27.679819148, -72.696098714), (-28.220438074, -69.795964761), (-29.027902052, -66.958527944))
        make_face()
    extrude(amount=-CUT_EXTRUDE4_DEPTH, mode=Mode.SUBTRACT)


solid = part.part
